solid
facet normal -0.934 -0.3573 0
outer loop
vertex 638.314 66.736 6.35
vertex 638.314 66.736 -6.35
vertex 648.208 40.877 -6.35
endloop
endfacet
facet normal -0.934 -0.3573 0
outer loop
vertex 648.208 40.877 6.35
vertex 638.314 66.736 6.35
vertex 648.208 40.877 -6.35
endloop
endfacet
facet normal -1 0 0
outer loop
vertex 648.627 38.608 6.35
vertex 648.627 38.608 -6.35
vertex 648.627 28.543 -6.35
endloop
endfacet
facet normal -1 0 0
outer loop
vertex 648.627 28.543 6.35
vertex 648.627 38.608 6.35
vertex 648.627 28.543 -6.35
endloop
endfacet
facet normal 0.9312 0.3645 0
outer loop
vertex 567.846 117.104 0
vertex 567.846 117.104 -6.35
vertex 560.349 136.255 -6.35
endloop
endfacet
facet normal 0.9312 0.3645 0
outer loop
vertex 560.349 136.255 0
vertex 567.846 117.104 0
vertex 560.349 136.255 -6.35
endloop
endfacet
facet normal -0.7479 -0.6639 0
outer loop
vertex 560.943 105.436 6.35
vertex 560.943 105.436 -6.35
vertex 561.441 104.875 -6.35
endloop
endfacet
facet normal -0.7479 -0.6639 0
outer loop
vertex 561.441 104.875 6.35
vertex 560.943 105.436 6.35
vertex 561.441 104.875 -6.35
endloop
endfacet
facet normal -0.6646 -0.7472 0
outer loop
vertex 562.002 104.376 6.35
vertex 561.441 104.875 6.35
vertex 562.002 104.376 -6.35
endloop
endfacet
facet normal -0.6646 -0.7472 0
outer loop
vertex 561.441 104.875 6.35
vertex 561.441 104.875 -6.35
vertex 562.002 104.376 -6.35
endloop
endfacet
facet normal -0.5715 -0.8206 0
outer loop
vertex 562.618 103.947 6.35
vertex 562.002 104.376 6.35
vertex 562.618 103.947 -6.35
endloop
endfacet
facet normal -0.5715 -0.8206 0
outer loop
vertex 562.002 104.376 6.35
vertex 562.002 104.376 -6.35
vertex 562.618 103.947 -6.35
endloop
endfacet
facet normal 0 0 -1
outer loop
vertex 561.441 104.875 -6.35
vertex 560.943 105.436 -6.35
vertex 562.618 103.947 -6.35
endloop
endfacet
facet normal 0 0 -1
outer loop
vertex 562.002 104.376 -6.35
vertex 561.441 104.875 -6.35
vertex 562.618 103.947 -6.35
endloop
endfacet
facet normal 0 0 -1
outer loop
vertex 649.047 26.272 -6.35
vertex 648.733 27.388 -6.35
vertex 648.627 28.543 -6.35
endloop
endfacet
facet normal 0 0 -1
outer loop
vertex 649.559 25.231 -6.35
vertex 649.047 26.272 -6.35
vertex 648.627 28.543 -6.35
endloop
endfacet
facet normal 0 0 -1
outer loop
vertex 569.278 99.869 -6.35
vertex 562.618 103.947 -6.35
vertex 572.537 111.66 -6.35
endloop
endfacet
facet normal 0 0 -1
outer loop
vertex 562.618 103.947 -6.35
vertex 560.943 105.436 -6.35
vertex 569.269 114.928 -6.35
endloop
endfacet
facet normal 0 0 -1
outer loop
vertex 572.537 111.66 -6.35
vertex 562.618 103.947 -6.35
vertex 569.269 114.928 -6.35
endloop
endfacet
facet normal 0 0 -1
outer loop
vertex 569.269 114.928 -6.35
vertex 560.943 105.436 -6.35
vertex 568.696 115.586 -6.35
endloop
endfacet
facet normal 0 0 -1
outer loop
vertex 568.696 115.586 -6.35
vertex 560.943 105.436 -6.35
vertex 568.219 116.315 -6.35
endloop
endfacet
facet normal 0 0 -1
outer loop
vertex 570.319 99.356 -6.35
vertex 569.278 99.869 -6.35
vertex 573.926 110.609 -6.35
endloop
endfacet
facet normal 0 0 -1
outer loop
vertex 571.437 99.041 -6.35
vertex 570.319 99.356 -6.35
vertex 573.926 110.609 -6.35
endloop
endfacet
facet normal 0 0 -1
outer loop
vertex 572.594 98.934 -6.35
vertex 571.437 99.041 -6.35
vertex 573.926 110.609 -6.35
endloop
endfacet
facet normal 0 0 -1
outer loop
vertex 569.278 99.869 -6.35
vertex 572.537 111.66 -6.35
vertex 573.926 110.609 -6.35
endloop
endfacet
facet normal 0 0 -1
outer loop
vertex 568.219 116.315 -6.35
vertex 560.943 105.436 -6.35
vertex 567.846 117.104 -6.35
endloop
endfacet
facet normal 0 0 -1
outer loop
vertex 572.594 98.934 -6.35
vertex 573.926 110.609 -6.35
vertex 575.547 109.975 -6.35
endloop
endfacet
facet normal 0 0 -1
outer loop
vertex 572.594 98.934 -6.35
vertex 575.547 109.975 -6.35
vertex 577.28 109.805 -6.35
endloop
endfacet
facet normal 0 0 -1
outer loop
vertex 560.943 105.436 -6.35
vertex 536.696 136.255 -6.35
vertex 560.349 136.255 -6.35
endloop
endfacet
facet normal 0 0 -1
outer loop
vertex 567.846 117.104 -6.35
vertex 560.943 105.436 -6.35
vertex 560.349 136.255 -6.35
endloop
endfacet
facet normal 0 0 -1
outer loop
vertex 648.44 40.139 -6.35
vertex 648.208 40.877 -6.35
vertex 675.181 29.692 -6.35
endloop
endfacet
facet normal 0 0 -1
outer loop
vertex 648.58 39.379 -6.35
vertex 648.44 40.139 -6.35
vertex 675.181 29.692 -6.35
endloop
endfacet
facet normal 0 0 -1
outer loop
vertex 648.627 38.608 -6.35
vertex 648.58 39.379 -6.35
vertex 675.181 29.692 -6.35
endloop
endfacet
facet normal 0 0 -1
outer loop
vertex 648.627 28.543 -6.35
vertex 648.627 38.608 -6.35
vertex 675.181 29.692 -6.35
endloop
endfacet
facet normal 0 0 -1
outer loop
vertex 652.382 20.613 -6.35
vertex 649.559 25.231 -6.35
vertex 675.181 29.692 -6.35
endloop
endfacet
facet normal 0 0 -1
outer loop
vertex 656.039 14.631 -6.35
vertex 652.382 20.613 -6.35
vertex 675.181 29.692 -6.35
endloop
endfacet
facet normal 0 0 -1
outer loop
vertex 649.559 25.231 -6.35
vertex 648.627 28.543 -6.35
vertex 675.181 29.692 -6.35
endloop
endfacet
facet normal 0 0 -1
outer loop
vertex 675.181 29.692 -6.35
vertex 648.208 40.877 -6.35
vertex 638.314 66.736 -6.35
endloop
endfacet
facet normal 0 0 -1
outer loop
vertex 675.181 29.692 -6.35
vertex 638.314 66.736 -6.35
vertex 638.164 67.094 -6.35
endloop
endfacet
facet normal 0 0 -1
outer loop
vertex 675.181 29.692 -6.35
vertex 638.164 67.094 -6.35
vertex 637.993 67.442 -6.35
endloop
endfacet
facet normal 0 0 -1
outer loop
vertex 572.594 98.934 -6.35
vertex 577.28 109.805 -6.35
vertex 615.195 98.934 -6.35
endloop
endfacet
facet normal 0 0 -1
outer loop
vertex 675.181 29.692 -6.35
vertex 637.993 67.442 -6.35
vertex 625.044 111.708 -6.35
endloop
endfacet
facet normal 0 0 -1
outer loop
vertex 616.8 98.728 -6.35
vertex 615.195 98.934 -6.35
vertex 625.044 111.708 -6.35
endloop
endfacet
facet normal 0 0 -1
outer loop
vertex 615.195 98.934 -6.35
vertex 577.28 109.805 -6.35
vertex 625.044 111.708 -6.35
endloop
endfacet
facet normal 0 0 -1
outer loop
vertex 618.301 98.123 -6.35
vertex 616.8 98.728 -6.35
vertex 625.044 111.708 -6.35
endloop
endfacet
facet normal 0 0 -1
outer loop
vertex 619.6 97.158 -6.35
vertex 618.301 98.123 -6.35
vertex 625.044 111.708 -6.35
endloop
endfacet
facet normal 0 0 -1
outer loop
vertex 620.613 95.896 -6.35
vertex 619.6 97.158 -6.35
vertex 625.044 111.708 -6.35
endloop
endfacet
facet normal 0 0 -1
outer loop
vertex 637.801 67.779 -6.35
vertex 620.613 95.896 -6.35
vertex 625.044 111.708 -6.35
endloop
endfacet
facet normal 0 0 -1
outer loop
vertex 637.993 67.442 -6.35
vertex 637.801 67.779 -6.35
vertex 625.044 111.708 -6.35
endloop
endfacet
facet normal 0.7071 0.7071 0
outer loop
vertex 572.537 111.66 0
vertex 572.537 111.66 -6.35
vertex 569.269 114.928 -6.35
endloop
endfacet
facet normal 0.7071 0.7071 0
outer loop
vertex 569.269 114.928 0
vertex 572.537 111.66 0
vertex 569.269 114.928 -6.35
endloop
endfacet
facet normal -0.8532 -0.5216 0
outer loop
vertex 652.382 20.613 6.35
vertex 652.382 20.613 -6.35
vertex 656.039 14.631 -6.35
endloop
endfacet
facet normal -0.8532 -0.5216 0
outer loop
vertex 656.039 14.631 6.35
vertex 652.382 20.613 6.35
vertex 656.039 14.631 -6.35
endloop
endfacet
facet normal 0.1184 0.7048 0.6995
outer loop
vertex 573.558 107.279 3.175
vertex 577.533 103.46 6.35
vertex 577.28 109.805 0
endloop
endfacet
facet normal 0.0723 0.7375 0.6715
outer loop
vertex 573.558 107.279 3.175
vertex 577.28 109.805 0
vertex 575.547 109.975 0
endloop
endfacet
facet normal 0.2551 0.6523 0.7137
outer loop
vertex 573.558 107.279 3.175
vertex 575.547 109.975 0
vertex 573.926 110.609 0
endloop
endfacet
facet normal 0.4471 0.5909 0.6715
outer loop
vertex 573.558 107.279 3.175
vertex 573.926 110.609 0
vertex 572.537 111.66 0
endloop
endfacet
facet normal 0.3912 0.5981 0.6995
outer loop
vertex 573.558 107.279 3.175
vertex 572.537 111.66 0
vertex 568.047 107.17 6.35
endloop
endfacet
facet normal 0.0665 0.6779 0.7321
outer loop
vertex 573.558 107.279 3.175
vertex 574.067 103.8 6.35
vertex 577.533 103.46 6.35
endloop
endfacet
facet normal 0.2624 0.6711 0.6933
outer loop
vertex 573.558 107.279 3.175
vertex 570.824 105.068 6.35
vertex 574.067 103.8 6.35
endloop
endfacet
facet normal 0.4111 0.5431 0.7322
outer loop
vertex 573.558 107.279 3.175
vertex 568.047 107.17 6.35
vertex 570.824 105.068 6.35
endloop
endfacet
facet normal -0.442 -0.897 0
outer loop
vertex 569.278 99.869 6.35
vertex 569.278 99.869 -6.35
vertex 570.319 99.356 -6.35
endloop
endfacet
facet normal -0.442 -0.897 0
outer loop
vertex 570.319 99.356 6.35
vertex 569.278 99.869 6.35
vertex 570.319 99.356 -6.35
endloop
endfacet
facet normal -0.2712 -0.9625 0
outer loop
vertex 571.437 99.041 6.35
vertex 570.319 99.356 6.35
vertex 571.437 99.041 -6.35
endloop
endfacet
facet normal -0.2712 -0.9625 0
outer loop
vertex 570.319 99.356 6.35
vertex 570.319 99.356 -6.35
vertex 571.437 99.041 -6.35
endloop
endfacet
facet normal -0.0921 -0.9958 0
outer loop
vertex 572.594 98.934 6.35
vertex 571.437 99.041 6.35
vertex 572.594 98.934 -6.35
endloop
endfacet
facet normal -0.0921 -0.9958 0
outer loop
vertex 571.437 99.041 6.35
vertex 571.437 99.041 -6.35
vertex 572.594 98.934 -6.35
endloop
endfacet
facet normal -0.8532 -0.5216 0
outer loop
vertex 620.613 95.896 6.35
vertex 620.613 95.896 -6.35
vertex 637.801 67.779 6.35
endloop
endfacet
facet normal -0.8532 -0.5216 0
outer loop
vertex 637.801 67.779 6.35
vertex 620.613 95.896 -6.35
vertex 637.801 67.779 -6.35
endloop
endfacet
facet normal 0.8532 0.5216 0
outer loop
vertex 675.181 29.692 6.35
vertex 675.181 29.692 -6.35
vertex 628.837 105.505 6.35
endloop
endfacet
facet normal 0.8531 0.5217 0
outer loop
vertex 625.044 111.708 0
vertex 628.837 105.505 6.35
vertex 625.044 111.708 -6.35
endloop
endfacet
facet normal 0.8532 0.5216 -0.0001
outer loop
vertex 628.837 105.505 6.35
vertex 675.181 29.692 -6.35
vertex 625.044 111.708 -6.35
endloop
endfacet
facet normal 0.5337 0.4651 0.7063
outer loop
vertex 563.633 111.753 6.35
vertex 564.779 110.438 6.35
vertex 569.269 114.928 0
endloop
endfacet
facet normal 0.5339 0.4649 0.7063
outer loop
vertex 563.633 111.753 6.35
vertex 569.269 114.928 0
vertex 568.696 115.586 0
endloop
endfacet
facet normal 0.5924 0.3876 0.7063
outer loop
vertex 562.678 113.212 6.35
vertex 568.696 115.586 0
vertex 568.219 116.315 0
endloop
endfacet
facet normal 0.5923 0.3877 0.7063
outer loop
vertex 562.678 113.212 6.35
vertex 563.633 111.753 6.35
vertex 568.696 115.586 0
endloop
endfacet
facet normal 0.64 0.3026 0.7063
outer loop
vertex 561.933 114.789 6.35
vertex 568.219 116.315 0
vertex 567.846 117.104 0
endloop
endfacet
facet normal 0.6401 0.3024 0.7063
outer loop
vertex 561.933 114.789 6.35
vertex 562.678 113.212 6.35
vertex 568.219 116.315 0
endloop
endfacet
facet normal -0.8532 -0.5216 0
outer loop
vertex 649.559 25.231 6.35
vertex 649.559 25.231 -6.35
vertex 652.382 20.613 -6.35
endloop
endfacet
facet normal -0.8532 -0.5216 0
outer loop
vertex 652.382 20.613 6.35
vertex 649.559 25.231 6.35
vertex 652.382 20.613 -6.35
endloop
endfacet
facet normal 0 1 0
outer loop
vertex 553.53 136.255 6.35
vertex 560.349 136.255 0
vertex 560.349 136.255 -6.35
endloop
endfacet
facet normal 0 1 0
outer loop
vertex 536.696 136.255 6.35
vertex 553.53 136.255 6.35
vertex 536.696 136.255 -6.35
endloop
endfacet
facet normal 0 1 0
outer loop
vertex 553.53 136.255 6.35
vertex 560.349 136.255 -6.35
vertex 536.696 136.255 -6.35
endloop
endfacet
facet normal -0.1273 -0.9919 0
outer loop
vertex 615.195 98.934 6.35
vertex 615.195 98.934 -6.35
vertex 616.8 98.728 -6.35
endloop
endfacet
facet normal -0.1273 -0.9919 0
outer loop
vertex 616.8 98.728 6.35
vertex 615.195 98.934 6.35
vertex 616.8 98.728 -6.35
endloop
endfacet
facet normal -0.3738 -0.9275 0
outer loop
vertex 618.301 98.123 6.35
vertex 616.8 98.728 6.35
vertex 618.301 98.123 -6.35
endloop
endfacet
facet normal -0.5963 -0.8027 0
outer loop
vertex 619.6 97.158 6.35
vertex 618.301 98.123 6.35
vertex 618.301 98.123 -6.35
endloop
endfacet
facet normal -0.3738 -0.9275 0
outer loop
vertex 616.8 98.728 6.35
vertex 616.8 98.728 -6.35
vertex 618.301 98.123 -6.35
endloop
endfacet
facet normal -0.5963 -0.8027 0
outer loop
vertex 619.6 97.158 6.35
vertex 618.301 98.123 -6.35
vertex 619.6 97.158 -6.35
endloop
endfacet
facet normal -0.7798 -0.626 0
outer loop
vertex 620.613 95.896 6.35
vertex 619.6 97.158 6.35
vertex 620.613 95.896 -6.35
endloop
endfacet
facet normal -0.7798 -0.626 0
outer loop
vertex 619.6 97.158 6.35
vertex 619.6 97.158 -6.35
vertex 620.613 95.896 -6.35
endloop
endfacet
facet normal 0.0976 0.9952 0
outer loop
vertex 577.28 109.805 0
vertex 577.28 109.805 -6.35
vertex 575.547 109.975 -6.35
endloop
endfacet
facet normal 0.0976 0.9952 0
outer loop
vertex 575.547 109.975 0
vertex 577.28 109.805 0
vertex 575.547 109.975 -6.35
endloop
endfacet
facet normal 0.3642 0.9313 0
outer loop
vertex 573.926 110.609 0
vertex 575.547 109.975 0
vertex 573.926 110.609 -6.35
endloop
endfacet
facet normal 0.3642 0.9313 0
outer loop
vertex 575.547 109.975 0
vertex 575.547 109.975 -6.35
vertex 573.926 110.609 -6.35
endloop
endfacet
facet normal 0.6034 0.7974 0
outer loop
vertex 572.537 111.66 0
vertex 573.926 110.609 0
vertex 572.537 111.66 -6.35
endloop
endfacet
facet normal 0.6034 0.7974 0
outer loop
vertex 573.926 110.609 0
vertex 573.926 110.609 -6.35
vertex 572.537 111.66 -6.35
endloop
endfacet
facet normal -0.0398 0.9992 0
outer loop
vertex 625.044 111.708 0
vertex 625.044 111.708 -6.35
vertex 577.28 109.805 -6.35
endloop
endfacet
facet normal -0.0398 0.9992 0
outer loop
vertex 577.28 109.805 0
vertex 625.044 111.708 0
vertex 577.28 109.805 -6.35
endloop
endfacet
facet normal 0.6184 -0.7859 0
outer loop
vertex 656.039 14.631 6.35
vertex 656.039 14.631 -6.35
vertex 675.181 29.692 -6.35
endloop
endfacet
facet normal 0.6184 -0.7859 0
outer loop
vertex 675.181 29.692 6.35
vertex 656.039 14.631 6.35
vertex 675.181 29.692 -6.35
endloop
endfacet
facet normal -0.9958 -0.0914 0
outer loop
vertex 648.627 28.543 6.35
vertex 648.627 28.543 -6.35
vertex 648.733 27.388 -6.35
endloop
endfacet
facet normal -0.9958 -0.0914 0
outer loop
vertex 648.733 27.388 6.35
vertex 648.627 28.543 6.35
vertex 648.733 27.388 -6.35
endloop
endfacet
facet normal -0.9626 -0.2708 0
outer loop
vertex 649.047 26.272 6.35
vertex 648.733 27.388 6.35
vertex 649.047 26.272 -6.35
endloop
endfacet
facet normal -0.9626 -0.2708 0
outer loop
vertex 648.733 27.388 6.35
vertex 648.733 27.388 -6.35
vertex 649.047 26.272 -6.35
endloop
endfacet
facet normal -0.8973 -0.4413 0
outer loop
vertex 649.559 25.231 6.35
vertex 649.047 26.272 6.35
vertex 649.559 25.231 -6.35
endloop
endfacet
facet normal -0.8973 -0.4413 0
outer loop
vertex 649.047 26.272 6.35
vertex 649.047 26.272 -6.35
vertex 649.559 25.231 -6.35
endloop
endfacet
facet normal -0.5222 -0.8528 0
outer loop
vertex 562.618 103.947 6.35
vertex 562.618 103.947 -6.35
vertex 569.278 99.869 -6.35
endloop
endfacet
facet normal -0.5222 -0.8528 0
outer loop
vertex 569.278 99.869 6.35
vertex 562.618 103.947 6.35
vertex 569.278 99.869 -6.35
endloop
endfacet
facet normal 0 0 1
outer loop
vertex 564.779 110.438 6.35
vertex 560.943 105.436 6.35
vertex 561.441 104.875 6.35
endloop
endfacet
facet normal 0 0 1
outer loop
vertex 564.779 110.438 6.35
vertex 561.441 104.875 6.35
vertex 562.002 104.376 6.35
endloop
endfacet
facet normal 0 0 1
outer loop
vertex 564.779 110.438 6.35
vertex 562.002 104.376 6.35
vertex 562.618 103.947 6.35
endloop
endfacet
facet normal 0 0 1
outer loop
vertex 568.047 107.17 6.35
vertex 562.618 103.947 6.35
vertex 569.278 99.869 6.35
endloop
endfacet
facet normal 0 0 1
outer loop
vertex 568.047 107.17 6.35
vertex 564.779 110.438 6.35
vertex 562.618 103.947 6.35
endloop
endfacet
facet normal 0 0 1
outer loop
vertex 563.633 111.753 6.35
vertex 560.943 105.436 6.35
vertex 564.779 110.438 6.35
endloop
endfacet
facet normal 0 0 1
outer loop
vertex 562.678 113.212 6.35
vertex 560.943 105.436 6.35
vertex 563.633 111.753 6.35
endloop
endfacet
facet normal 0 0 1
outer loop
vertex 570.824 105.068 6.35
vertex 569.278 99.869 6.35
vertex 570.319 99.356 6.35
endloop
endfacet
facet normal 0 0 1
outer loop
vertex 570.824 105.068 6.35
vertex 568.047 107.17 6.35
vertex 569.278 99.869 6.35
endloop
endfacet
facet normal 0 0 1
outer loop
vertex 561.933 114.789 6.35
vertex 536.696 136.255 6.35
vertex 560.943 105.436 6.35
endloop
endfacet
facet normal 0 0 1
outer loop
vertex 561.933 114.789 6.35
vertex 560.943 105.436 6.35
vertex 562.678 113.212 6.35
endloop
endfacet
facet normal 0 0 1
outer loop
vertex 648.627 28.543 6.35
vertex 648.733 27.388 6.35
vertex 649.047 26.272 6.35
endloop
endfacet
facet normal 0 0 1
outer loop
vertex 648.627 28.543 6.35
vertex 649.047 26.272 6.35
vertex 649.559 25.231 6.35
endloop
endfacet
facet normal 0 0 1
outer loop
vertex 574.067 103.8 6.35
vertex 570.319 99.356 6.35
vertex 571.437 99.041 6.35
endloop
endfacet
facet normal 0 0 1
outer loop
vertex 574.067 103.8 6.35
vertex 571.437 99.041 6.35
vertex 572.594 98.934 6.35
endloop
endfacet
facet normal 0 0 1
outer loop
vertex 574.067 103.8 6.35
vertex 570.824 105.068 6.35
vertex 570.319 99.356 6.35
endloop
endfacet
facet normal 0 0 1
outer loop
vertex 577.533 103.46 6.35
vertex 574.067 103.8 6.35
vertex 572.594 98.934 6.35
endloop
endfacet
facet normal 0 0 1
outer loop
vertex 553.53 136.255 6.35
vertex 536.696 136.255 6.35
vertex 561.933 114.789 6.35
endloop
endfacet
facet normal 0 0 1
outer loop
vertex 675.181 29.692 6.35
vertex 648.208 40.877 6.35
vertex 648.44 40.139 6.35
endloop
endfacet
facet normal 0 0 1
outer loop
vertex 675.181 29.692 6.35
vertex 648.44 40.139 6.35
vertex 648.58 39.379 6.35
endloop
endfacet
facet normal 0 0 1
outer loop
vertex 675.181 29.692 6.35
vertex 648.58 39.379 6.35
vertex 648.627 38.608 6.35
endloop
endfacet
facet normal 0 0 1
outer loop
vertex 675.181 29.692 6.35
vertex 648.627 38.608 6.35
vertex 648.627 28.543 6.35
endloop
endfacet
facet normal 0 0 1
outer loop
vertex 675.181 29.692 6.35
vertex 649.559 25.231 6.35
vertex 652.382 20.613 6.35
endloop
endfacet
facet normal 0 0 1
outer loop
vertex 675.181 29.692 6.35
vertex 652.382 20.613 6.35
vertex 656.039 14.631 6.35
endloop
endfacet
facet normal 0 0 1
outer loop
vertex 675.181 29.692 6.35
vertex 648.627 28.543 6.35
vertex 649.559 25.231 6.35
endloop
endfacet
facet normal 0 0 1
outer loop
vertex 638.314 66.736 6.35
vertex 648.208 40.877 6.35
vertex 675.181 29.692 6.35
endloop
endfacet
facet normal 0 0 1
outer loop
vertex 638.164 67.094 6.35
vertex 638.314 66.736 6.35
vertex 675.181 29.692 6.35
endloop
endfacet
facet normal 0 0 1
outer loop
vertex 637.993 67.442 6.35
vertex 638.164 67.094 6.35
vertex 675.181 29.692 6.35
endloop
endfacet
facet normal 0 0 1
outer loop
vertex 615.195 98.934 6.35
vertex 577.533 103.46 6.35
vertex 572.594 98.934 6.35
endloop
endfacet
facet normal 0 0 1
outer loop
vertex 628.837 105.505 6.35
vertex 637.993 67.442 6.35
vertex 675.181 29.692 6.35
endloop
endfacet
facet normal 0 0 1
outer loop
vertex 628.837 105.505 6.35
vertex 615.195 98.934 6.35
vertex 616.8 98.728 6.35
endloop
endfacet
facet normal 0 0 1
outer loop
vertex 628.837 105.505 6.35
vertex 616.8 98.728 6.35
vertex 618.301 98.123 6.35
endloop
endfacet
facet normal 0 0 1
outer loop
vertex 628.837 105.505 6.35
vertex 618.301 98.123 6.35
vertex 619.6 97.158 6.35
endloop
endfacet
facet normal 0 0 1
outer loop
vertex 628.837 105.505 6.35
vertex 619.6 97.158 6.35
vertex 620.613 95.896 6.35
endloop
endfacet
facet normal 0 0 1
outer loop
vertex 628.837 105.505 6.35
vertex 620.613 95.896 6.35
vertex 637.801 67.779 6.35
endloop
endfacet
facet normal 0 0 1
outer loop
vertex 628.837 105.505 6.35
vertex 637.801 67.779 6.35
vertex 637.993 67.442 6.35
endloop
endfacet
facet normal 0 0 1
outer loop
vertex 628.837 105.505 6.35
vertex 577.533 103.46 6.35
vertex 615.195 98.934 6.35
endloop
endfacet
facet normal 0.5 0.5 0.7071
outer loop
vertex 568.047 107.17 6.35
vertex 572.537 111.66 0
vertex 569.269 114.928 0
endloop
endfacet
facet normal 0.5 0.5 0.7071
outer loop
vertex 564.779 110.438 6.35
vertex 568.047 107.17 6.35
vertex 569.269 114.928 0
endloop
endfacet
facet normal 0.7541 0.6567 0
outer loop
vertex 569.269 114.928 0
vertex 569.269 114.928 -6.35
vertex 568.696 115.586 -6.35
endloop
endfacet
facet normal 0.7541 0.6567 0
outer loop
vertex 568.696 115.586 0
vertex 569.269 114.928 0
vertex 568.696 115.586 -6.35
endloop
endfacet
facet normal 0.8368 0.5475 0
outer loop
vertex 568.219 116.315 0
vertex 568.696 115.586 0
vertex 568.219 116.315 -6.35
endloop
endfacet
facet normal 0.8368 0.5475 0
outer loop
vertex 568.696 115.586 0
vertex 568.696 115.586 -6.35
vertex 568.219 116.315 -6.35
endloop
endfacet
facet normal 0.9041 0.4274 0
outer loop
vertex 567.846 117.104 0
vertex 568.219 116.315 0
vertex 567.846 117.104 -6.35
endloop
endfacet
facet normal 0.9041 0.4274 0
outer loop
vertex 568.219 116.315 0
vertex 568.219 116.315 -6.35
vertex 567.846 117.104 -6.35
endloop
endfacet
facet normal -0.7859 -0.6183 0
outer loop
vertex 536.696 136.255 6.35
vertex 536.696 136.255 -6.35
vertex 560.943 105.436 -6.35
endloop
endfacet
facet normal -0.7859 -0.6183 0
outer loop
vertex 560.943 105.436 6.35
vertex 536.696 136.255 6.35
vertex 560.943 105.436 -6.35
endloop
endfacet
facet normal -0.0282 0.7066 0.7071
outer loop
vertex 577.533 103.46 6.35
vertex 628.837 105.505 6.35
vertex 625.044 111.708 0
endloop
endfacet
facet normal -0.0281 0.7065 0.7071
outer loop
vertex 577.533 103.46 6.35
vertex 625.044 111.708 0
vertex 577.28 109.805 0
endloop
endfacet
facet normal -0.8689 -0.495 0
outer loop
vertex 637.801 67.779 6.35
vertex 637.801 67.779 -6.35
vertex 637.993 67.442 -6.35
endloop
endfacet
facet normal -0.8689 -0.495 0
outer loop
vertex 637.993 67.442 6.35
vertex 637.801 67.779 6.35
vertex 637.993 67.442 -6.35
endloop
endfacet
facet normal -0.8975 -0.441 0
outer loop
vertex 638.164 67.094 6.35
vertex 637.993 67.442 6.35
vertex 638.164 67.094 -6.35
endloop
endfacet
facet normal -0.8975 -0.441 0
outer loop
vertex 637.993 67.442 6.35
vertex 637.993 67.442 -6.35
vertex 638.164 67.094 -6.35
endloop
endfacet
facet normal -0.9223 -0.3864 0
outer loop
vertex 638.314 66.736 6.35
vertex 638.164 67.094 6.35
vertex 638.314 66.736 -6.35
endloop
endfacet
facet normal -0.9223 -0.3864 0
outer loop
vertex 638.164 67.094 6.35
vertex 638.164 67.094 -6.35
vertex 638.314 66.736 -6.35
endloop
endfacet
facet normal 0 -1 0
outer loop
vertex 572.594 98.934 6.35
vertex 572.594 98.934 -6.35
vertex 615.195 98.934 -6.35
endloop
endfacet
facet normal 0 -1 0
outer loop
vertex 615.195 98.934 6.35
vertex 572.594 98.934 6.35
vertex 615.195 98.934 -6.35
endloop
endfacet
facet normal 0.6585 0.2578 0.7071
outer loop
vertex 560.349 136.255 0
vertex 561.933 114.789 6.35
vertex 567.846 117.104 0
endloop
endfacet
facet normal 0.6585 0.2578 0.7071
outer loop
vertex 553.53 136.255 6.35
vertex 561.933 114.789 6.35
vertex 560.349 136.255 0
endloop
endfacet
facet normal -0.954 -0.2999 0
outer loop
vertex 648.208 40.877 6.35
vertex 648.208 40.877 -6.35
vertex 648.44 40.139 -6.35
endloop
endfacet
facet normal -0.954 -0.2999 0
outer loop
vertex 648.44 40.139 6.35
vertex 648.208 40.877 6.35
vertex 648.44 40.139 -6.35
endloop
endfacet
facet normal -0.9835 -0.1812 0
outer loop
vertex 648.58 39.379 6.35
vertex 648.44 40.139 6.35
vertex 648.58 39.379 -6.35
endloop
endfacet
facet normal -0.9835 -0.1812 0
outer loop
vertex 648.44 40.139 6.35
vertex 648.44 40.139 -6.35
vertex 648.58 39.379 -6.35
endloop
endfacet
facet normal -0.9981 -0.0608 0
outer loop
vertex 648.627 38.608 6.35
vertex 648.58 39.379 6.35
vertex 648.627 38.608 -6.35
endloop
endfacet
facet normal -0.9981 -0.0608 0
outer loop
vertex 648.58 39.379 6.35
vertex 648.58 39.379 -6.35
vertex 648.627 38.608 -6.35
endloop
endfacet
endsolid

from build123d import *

# Parameters (mm, degrees)
BOSS_EXTRUDE1_DEPTH      = 6.35
BOSS_EXTRUDE1_DEPTH_BACK = 6.35
CHAMFER1_SIZE            = 6.35


with BuildPart() as part:
    # Sketch1 → Boss-Extrude1 (new, two sides: drawn at the far end of the back side and taken through both)
    with BuildSketch(Plane.XY.offset(-BOSS_EXTRUDE1_DEPTH_BACK)):
        with BuildLine():
            Line((536.695979739, 136.254867707), (560.943105898, 105.436216324))
            ThreePointArc((560.943105898, 105.436216324), (561.714171823, 104.617286319), (562.617631945, 103.947249887))
            Line((562.617631945, 103.947249887), (569.277605982, 99.869101199))
            ThreePointArc((569.277605982, 99.869101199), (570.871029516, 99.172603505), (572.593645863, 98.934484797))
            Line((572.593645863, 98.934484797), (615.194822187, 98.934484797))
            ThreePointArc((615.194822187, 98.934484797), (618.300590104, 98.123140378), (620.612705276, 95.896439332))
            Line((620.612705276, 95.896439332), (637.800986726, 67.778873585))
            ThreePointArc((637.800986726, 67.778873585), (638.081311904, 67.269225698), (638.313826657, 66.736065249))
            Line((638.313826657, 66.736065249), (648.207776972, 40.876876924))
            ThreePointArc((648.207776972, 40.876876924), (648.521355002, 39.761509046), (648.627053953, 38.607730725))
            Line((648.627053953, 38.607730725), (648.627053953, 28.543161139))
            ThreePointArc((648.627053953, 28.543161139), (648.864523478, 26.822849773), (649.559170865, 25.231206604))
            Line((649.559170865, 25.231206604), (652.382425554, 20.612766444))
            Line((652.382425554, 20.612766444), (656.038853698, 14.631373886))
            Line((656.038853698, 14.631373886), (675.181083361, 29.691866048))
            Line((675.181083361, 29.691866048), (625.044285009, 111.708484642))
            Line((625.044285009, 111.708484642), (577.280315143, 109.804848162))
            ThreePointArc((577.280315143, 109.804848162), (574.71471638, 110.235943554), (572.537308132, 111.659682846))
            Line((572.537308132, 111.659682846), (569.268870721, 114.928120257))
            ThreePointArc((569.268870721, 114.928120257), (568.444852538, 115.94228087), (567.845871294, 117.103637483))
            Line((567.845871294, 117.103637483), (560.349390782, 136.254867707))
            Line((560.349390782, 136.254867707), (536.695979739, 136.254867707))
        make_face()
    extrude(amount=BOSS_EXTRUDE1_DEPTH + BOSS_EXTRUDE1_DEPTH_BACK)

    # Chamfer1
    chamfer1_edges = [part.edges().sort_by_distance(p)[0] for p in [
        (574.71471638, 110.235943554, 6.35),
        (570.903089427, 113.293901552, 6.35),
        (601.162300076, 110.756666402, 6.35),
        (568.444852538, 115.94228087, 6.35),
        (564.097631038, 126.679252595, 6.35),
    ]]
    chamfer(chamfer1_edges, length=CHAMFER1_SIZE)


solid = part.part
